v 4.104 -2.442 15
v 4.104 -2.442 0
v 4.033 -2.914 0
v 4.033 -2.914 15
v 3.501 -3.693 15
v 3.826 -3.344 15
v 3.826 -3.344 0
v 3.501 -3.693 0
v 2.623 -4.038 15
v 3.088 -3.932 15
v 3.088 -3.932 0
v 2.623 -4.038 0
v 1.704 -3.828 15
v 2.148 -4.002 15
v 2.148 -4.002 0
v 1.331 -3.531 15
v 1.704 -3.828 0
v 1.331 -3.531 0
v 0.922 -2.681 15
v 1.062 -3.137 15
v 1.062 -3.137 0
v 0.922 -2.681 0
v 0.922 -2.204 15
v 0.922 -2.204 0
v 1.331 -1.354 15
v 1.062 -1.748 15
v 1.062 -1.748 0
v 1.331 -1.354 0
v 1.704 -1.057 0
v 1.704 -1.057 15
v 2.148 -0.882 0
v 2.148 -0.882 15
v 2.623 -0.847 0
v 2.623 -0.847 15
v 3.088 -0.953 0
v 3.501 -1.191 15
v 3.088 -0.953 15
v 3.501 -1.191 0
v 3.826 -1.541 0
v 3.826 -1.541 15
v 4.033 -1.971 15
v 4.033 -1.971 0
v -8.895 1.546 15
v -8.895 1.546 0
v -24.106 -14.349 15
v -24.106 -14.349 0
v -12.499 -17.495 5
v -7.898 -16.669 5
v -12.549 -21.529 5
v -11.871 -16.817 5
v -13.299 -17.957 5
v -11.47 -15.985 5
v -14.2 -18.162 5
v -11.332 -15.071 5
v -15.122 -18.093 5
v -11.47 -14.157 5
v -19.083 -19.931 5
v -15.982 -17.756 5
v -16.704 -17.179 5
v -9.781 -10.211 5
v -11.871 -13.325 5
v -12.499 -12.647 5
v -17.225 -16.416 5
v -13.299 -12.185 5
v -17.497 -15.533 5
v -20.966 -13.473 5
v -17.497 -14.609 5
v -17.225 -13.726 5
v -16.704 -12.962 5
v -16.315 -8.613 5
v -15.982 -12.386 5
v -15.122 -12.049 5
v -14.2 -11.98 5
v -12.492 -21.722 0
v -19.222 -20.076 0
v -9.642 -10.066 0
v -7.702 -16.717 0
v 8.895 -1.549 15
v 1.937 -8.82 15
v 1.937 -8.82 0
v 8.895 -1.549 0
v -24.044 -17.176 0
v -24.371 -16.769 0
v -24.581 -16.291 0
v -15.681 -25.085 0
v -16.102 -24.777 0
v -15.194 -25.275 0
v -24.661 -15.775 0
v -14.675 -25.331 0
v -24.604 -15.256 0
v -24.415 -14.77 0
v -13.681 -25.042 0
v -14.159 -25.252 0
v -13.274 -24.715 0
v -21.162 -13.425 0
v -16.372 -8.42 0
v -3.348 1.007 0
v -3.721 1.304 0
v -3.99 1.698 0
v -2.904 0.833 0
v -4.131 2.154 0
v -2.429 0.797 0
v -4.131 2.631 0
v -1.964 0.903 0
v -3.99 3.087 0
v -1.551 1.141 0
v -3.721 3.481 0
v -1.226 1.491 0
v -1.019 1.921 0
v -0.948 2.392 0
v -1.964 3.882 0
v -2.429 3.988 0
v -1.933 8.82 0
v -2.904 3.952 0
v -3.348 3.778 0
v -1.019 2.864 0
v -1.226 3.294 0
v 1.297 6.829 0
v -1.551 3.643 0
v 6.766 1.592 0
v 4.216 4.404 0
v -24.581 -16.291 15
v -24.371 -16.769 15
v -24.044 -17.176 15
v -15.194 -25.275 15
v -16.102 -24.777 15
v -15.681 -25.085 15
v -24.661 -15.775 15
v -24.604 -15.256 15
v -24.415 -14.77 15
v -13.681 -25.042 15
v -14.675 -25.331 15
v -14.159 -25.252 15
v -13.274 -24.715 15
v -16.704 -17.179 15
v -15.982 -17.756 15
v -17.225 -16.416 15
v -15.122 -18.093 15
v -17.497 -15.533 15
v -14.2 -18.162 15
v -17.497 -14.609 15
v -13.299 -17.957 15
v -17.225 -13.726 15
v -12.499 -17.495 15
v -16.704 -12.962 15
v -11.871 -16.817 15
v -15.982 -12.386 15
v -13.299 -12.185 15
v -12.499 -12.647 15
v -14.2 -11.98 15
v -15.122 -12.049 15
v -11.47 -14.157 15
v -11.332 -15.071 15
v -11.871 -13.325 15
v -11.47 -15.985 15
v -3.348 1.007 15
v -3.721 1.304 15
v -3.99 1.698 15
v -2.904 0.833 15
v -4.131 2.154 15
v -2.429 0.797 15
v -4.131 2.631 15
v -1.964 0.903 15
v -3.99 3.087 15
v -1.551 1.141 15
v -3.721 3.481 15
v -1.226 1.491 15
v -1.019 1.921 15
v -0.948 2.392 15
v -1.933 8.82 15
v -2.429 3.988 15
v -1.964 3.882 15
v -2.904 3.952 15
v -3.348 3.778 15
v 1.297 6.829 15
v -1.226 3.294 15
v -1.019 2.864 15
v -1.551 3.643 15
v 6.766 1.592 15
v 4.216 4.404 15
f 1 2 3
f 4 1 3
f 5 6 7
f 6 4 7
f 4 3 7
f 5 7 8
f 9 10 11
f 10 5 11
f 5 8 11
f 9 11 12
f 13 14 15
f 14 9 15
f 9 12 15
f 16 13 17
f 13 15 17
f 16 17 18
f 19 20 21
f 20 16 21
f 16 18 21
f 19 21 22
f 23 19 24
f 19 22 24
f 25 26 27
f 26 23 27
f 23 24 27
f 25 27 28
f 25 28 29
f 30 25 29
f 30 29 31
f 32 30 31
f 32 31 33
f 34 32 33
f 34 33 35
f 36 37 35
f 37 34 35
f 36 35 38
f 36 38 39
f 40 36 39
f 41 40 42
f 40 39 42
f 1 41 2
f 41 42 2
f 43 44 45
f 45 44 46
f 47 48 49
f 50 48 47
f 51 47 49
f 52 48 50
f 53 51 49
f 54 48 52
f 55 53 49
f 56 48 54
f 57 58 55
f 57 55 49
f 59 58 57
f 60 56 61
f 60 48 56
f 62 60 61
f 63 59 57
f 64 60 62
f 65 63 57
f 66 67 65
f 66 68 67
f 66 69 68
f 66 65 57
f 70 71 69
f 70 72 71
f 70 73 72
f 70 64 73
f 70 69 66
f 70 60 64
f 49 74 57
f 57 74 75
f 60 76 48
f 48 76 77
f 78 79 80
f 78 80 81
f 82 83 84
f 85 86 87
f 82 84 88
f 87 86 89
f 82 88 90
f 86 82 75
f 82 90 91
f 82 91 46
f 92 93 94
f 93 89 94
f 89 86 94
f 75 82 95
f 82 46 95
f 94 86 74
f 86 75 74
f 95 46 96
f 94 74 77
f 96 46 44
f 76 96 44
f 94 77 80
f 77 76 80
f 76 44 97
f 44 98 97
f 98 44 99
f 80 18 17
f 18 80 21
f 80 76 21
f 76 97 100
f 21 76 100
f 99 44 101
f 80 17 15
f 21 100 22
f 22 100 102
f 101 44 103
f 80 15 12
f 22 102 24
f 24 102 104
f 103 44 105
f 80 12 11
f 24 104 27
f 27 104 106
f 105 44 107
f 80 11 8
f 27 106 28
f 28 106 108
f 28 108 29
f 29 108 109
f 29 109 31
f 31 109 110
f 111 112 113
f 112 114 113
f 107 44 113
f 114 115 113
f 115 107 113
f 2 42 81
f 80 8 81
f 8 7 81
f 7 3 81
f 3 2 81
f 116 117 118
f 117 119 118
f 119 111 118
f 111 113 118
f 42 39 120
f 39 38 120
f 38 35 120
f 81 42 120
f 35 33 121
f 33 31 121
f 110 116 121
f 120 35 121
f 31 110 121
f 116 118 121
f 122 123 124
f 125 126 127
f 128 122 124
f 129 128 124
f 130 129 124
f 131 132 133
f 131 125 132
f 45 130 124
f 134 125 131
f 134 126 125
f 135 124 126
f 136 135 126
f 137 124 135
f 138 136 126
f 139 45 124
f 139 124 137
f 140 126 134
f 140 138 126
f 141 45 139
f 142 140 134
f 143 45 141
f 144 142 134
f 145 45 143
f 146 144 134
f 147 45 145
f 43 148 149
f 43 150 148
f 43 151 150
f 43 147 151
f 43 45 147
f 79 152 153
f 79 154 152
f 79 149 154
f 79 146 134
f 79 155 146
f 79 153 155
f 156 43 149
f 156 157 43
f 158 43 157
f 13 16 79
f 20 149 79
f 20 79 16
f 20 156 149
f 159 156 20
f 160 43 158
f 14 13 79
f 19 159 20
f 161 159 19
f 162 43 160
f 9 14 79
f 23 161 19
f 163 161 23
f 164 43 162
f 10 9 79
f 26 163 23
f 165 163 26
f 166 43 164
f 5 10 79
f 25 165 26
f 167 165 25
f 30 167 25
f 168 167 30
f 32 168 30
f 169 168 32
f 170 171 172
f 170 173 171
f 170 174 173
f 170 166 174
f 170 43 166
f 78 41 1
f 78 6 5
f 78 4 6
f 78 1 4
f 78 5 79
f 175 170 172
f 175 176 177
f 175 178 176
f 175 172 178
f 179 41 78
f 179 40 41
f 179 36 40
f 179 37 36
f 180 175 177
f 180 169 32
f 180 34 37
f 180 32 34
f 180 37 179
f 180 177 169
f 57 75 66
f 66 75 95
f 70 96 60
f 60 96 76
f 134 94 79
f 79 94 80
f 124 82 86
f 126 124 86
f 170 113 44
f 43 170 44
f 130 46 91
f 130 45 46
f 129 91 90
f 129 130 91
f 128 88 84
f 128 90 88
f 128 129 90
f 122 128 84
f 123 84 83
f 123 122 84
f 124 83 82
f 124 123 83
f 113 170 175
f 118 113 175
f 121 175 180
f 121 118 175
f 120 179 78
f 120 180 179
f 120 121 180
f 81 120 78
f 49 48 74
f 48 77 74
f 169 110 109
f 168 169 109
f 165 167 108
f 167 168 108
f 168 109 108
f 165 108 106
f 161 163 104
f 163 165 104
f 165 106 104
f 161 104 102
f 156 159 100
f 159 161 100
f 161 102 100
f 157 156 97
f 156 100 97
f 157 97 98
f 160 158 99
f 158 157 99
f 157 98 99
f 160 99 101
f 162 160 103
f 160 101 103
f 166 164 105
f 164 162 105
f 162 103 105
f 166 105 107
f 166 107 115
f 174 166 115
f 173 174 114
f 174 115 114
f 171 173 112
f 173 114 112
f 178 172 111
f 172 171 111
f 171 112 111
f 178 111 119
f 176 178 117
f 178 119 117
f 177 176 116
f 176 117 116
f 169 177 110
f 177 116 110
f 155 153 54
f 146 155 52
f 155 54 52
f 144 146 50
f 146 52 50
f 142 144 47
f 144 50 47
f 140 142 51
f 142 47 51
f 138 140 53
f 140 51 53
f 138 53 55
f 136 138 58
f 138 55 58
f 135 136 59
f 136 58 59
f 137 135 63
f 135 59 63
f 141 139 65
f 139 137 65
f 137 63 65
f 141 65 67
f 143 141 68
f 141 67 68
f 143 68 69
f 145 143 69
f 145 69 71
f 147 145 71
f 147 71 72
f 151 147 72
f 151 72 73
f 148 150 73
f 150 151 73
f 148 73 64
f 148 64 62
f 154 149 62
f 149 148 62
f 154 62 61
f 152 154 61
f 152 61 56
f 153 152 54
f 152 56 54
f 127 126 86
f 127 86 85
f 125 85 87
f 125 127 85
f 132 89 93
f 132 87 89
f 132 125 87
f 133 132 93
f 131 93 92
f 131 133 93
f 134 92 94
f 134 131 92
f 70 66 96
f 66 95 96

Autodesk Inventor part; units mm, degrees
ref_plane "YZ Plane" through (0, 0, 0) normal (1, 0, 0) x (0, 1, 0)
ref_plane "XZ Plane" through (0, 0, 0) normal (0, 1, 0) x (-1, 0, 0)
ref_plane "XY Plane" through (0, 0, 0) normal (0, 0, 1) x (1, 0, 0)
sketch "Skizze1" plane through (0, 0, 0) normal (0, 0, 1) x (1, 0, 0)
  circle A0 centre (2.503632, -2.442355) radius 1.4 construction
  circle A1 centre (-2.548384, 2.392405) radius 1.4 construction
  arc A2 (8.895275, -1.548845) -> (-1.933457, 8.820314) centre (-14.431862, -15.070948) ccw
  line L0 (-1.933457, 8.820314) -> (-8.895275, 1.545658)
  line L1 (-8.895275, 1.545658) -> (1.936506, -8.820314)
  line L2 (1.936506, -8.820314) -> (8.895275, -1.548845)
  arc A3 (-17.414954, -14.752893) -> (-12.725508, -17.538408) centre (-14.431862, -15.070948) ccw
  line L3 (-8.895275, 1.545658) -> (-25.488913, -15.793637)
  line L4 (-25.488913, -15.793637) -> (-14.657133, -26.159609)
  line L5 (-14.657133, -26.159609) -> (1.936506, -8.820314)
  arc A4 (-13.288846, -12.847547) -> (-12.20846, -16.213964) centre (-14.431862, -15.070948) ccw
  circle A5 centre (-14.431862, -15.070948) radius 3.1
  circle A6 centre (-2.548384, 2.392405) radius 1.6
  circle A7 centre (2.503632, -2.442355) radius 1.6
  circle A8 centre (-22.802017, -23.070943) radius 1.4
  circle A9 centre (-6.057441, -7.070954) radius 1.4
  point P0 (0, 0)
  dimension "d0" = 24
  dimension "d1" = 6.2
  dimension "d2" = 3.2
  dimension "d3" = 3.2
extrude "Extrusion1" add sketch "Skizze1" along normal blind 15 contours L2 L1 L0 A2 | L5 L4 L3 L1 | A9
sketch "Skizze2" plane through (0, 0, 15) normal (0, 0, 1) x (1, 0, 0)
  point P0 (0, 0)
sketch "Skizze3" plane through (0, 0, 15) normal (0, 0, 1) x (1, 0, 0)
  point P0 (0, 0)
fillet "Rundung1" radius 2 2 edges at (-14.6571, -26.1596, 7.5) (-25.4889, -15.7936, 7.5)
sketch "Skizze4" plane through (0, 0, 0) normal (0, 0, -1) x (-1, 0, 0)
  circle A0 centre (14.431862, -15.070948) radius 3.1
  line L0 (21.161771, -13.42525) -> (19.222032, -20.076372)
  line L1 (19.222032, -20.076372) -> (12.492123, -21.72207)
  line L2 (12.492123, -21.72207) -> (7.701952, -16.716646)
  line L3 (7.701952, -16.716646) -> (9.641691, -10.065525)
  line L4 (9.641691, -10.065525) -> (16.3716, -8.419827)
  line L5 (16.3716, -8.419827) -> (21.161771, -13.42525)
  line L6 (1.933457, 8.820314) -> (24.10611, -14.348696)
  point P0 (0, 0)
  dimension "d10" = 12
sketch "Skizze4 outline for Extrusion2" plane through (0, 0, 0) normal (0, 0, -1) x (-1, 0, 0)
  line L0 (21.161771, -13.42525) -> (16.3716, -8.419827)
  line L1 (19.222032, -20.076372) -> (21.161771, -13.42525)
  line L2 (12.492123, -21.72207) -> (19.222032, -20.076372)
  line L3 (7.701952, -16.716646) -> (12.492123, -21.72207)
  line L4 (9.641691, -10.065525) -> (7.701952, -16.716646)
  line L5 (16.3716, -8.419827) -> (9.641691, -10.065525)
extrude "Extrusion2" cut sketch "Skizze4 outline for Extrusion2" against normal blind 5 draft -2
properties part number "IM_Matchboxscope_Laserholder_M12"
